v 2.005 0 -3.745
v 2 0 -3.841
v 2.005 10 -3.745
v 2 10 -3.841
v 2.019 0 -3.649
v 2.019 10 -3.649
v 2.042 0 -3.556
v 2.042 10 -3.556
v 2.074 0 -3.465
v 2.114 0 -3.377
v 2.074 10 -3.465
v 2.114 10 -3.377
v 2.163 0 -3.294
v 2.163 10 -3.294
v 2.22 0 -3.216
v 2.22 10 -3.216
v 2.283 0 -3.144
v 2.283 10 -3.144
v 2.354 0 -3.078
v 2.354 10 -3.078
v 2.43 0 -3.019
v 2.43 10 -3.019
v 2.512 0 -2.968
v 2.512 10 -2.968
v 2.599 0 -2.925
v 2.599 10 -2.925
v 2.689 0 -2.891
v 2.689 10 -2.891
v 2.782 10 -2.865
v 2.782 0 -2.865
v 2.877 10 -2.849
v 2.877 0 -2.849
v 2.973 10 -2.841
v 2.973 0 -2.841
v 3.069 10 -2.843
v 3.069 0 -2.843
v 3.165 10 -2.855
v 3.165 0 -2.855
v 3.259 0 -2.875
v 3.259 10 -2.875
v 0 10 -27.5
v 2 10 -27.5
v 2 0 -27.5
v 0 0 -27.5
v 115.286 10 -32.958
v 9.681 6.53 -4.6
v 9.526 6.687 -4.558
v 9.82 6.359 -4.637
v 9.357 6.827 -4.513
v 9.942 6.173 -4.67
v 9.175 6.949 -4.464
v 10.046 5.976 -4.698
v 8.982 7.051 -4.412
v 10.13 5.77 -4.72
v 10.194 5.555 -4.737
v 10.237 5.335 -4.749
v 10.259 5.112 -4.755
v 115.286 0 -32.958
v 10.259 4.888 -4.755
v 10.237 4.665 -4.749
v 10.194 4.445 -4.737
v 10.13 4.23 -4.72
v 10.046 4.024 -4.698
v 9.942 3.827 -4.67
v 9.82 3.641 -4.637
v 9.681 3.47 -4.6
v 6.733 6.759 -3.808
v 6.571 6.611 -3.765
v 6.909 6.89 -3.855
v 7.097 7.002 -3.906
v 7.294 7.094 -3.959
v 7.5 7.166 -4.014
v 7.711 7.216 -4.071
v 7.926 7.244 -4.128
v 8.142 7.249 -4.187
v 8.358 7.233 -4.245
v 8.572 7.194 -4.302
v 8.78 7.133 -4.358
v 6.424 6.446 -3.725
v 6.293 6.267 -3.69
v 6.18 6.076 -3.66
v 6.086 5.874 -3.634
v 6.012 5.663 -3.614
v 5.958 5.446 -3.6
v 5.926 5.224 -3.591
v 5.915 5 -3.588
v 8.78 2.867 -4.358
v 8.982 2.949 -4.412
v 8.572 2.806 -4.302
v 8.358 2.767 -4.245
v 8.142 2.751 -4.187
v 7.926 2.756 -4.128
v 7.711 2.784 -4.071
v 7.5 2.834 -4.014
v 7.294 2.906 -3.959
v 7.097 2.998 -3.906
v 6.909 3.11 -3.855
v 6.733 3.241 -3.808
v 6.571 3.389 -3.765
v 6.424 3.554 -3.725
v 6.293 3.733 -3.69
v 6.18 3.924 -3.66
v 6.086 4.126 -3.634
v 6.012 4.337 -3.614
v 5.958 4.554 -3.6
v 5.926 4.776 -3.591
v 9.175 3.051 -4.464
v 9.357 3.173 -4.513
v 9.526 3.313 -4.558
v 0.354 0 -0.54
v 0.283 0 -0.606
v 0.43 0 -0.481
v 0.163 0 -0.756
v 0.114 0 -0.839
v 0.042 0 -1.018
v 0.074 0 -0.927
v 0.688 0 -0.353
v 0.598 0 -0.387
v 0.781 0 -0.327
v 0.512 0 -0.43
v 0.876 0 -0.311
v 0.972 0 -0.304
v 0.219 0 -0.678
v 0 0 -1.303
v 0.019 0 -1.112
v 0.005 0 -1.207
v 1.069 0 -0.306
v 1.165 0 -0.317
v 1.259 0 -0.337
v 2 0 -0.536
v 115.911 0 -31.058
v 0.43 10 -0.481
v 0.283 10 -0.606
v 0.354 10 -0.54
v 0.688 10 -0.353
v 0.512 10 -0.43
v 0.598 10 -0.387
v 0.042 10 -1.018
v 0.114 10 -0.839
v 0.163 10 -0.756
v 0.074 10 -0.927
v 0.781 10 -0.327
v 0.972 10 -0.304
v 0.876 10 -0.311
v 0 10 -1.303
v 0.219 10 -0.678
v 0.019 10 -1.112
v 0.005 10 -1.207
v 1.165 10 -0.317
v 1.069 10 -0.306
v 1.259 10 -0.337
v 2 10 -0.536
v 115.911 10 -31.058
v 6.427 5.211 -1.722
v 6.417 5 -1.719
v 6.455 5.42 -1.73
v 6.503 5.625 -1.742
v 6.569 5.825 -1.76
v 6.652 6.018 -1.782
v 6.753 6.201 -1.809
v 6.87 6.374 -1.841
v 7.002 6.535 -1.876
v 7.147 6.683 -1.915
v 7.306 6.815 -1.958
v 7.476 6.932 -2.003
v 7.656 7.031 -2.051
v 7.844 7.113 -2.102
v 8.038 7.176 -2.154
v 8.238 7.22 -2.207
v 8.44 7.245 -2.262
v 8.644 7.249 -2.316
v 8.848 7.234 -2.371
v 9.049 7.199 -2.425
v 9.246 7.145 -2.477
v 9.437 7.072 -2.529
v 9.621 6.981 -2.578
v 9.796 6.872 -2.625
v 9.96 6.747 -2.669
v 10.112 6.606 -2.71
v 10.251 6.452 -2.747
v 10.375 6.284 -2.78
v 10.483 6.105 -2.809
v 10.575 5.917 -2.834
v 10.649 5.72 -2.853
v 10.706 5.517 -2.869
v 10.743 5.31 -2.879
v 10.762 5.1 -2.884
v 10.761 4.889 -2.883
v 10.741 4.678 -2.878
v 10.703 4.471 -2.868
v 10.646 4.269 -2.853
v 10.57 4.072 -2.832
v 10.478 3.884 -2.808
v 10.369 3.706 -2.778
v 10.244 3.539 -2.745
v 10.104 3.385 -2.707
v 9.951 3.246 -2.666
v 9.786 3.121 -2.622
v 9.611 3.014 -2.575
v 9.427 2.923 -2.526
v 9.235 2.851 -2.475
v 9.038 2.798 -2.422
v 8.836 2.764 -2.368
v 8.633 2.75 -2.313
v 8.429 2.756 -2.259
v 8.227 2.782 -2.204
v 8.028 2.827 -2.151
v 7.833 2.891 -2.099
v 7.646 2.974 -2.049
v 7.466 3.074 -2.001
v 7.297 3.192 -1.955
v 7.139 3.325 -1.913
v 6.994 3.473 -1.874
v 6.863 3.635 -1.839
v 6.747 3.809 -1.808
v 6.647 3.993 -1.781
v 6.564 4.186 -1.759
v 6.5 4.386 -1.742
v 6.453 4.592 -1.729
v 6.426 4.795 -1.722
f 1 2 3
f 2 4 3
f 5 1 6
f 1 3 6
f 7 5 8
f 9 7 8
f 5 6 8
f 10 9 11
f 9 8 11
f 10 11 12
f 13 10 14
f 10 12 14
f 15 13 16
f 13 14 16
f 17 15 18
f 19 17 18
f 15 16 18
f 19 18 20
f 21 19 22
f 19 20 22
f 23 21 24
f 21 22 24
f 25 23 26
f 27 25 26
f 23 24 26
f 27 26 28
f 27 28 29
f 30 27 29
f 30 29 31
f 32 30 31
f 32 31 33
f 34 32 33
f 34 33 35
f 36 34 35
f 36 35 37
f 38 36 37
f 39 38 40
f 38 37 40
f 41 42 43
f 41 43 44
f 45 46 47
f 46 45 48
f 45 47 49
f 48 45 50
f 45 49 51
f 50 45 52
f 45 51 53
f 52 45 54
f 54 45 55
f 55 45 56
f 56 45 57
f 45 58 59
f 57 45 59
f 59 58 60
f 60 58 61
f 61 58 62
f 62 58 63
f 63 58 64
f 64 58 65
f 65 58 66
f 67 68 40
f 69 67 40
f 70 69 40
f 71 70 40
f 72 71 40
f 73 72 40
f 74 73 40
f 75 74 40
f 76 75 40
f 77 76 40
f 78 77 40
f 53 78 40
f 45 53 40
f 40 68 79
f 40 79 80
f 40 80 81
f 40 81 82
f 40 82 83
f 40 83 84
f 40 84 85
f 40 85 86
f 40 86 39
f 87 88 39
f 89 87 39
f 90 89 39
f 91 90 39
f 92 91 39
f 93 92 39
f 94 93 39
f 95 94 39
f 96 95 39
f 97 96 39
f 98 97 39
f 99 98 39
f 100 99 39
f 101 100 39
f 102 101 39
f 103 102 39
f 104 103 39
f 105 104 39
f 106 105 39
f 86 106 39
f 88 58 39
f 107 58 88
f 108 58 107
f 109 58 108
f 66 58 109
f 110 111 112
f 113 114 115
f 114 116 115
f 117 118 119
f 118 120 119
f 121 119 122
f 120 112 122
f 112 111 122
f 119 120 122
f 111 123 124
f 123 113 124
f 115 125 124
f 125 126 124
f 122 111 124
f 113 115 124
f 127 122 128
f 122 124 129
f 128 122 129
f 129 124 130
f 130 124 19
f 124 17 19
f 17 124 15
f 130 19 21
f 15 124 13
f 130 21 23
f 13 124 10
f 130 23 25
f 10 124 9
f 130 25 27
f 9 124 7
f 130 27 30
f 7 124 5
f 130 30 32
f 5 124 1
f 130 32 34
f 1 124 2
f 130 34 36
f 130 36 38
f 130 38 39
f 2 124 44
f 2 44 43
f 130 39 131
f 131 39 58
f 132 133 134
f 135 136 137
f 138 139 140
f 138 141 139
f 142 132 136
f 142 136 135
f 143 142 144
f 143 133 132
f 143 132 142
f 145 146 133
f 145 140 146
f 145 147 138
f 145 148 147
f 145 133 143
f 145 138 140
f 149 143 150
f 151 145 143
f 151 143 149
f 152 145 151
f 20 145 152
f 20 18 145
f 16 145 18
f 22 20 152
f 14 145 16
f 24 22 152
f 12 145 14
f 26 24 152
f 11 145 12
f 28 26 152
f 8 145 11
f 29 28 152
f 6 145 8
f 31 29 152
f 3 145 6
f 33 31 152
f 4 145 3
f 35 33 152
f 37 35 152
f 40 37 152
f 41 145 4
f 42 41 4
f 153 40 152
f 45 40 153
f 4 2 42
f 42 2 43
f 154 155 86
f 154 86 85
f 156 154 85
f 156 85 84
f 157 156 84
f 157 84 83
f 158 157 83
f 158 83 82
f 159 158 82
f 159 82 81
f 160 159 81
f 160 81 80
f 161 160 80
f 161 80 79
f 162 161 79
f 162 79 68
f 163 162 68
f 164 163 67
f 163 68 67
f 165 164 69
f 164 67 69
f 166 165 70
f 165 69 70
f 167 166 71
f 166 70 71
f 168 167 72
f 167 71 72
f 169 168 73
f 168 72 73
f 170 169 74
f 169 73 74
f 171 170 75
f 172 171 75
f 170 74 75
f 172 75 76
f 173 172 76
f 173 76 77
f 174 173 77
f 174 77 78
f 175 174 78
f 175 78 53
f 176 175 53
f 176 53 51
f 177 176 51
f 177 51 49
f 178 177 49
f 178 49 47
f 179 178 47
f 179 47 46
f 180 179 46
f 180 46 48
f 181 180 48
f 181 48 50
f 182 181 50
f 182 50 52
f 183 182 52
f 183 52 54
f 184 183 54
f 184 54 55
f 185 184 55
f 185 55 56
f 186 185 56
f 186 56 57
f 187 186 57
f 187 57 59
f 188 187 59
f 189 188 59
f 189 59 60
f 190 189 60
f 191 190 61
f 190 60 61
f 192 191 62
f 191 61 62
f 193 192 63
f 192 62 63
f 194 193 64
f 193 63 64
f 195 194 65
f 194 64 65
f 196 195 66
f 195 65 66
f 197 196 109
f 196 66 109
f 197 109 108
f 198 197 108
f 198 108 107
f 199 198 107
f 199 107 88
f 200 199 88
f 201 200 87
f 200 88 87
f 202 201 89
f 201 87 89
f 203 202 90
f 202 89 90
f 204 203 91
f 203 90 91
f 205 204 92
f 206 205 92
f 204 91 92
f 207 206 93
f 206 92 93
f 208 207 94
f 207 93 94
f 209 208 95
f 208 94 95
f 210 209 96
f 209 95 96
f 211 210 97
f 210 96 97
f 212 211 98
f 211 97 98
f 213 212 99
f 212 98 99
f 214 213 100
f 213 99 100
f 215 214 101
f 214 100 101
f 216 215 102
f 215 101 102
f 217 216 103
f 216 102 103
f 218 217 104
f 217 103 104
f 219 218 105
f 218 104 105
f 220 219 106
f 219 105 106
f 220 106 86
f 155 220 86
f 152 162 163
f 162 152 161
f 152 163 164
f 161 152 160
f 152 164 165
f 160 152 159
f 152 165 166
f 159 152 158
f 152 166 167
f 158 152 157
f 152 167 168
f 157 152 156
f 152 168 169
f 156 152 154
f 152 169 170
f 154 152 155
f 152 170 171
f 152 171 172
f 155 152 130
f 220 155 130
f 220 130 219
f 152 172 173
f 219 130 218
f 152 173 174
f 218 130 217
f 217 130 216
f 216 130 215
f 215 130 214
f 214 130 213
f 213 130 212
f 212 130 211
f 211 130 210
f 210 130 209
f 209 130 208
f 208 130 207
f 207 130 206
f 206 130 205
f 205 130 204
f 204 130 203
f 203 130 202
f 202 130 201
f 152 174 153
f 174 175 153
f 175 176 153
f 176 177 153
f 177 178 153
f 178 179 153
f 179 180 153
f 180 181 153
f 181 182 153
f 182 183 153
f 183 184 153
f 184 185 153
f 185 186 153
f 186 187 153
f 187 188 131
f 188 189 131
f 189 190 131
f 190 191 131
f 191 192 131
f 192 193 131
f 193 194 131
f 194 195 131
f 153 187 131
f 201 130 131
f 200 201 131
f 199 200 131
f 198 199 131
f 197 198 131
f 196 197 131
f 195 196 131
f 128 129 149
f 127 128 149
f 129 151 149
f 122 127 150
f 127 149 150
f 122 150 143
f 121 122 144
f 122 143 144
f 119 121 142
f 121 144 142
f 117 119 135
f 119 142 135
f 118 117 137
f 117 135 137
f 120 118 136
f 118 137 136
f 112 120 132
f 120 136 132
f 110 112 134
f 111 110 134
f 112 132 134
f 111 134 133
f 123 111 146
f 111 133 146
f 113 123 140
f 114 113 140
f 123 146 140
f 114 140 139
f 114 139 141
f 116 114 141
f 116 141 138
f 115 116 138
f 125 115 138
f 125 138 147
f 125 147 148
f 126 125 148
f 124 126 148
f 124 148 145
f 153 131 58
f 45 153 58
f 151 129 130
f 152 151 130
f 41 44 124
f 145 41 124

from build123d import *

# Parameters (mm, degrees)
BOSS_EXTRUDE1_DEPTH = 10
BOSS_EXTRUDE2_DEPTH = 10
FILLET1_R           = 1
SKETCH4_R           = 2.25
CUT_EXTRUDE1_DEPTH  = 10


with BuildPart() as part:
    # Sketch1 → Boss-Extrude1 (new body)
    with BuildSketch(Plane(origin=(0, 0, 0), x_dir=(1, 0, 0), z_dir=(0, 1, 0))):
        Polygon((0, 0), (2, 0.535898385), (2, 27.5), (0, 27.5), align=None)
    extrude(amount=BOSS_EXTRUDE1_DEPTH)

    # Sketch3 → Boss-Extrude2 (add)
    with BuildSketch(Plane.XZ):
        Polygon((0, 0), (115.911099155, -31.058285412), (115.285791267, -32.958019616), (0, -2), align=None)
    extrude(amount=-BOSS_EXTRUDE2_DEPTH)

    # Fillet1
    fillet1_edges = [part.edges().sort_by_distance(p)[0] for p in [
        (2, 5, -2.537065657),
        (0, 5, 0),
    ]]
    fillet(fillet1_edges, radius=FILLET1_R)

    # Sketch4 → Cut-Extrude1 (cut)
    with BuildSketch(Plane(origin=(-0.500942736, 0, -1.86548043), x_dir=(-0.9657847664118184, 0, 0.25934491505882573), z_dir=(-0.25934491505882573, 0, -0.9657847664118184))):
        with Locations((-8.893504829, 5)):
            Circle(SKETCH4_R)
    extrude(amount=-CUT_EXTRUDE1_DEPTH, mode=Mode.SUBTRACT)


solid = part.part
